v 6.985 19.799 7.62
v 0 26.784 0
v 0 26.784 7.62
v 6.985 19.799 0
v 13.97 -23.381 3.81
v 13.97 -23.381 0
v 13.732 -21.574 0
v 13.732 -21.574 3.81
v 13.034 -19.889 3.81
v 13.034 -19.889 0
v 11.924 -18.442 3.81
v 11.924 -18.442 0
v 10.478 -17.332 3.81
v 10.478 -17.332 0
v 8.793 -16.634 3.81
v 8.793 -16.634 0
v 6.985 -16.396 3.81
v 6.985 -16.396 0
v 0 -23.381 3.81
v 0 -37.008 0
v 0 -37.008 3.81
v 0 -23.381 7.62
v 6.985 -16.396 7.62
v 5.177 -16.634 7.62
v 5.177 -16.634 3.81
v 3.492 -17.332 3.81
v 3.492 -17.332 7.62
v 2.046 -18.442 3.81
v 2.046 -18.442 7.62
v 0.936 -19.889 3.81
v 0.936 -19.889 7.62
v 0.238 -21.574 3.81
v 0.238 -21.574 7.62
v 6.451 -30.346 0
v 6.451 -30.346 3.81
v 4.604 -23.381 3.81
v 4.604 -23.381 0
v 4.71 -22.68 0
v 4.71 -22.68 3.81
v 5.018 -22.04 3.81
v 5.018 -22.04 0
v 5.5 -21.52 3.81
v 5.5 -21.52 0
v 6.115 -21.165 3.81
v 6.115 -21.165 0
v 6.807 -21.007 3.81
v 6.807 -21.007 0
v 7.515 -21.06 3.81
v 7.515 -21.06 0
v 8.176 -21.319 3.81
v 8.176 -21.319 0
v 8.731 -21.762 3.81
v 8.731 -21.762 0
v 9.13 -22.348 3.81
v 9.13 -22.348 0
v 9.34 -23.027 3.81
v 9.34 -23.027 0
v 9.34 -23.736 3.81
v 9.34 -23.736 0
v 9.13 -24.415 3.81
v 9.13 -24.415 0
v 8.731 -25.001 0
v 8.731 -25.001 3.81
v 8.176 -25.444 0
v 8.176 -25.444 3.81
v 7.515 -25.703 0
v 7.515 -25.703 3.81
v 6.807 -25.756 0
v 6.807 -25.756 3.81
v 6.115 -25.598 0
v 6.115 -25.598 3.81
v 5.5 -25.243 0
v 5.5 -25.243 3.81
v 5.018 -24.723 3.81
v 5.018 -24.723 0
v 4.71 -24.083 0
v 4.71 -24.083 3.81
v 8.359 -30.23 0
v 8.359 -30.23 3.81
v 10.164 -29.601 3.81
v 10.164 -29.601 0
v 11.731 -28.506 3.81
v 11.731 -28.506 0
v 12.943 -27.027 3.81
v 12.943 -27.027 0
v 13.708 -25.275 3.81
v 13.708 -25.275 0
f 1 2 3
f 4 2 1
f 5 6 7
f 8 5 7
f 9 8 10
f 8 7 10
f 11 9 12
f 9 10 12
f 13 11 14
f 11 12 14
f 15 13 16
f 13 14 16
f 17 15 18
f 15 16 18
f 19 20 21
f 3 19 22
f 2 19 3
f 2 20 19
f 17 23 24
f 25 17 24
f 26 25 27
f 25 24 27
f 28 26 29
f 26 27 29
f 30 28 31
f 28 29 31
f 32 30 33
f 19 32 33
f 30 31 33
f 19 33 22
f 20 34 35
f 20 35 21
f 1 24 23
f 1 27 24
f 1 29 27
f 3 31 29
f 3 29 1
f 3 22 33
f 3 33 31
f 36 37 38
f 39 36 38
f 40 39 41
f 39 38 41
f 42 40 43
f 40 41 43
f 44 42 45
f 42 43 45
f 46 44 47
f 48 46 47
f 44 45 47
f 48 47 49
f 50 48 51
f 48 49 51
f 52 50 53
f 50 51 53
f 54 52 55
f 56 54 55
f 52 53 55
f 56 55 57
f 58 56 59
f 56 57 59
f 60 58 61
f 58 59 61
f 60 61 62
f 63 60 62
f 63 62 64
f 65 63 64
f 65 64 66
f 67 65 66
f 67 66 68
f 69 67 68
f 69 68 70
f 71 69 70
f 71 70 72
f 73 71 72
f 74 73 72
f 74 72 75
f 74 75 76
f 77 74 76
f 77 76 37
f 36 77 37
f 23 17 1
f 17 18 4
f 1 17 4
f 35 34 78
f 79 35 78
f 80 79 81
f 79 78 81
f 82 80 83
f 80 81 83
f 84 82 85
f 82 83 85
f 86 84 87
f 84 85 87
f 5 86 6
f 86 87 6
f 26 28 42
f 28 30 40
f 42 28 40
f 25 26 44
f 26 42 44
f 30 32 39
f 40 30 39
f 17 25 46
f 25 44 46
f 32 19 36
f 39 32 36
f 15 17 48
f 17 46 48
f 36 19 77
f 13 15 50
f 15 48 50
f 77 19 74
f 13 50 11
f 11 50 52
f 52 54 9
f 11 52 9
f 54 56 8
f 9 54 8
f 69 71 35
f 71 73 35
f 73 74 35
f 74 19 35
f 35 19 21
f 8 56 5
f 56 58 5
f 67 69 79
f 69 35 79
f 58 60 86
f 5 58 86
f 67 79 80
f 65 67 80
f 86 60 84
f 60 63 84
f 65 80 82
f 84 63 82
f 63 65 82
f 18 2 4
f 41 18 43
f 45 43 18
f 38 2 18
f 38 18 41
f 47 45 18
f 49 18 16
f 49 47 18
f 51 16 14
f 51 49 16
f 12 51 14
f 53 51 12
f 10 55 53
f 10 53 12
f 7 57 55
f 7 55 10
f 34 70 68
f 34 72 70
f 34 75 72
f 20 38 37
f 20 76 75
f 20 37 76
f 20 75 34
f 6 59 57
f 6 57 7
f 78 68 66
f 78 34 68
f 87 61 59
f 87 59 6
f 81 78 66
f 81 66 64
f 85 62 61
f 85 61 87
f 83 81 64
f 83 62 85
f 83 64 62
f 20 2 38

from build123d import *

# Parameters (mm, degrees)
F1_DEPTH    = 7.62
F3_DEPTH    = 3.81
F5_DEPTH    = 3.81
F7_D        = 4.7625
F7_DEPTH    = 12.7
F7_TIP      = 1.4307993491
F8_T1_DEPTH = 46.8124487366


# Not quite as in the source:
# - a fillet or chamfer that OpenCascade refuses, or shapes differently, is made with other operations: its cross-section is extruded or revolved along the edge and cut away or added


with BuildPart() as f1:
    # F0 (on Top) → F1 (new body)
    with BuildSketch(Plane.XY):
        with BuildLine():
            Line((6.985, 27.4185502146), (0, 27.4185502146))
            Line((0, 27.4185502146), (0, -23.3814497854))
            ThreePointArc((0, -23.3814497854), (2.0458591334, -18.4423089188), (6.985, -16.3964497854))
            Line((6.985, -16.3964497854), (6.985, 27.4185502146))
        make_face()
        with BuildLine():
            ThreePointArc((6.985, -16.3964497854), (2.0458591334, -18.4423089188), (0, -23.3814497854))
            Line((0, -23.3814497854), (6.985, -23.3814497854))
            Line((6.985, -23.3814497854), (6.985, -16.3964497854))
        make_face()
        with BuildLine():
            Line((6.985, -23.3814497854), (0, -23.3814497854))
            ThreePointArc((0, -23.3814497854), (6.985, -30.3664497854), (13.97, -23.3814497854))
            ThreePointArc((13.97, -23.3814497854), (11.9241408666, -18.4423089188), (6.985, -16.3964497854))
            Line((6.985, -16.3964497854), (6.985, -23.3814497854))
        make_face()
    extrude(amount=F1_DEPTH)

    # F2 (on face) → F3 (cut)
    with BuildSketch(Plane.XY.offset(7.62)):
        with BuildLine():
            ThreePointArc((0, -23.3814497854), (6.985, -30.3664497854), (13.97, -23.3814497854))
            ThreePointArc((13.97, -23.3814497854), (11.9241408666, -18.4423089188), (6.985, -16.3964497854))
            ThreePointArc((6.985, -16.3964497854), (2.0458591334, -18.4423089188), (0, -23.3814497854))
        make_face()
    extrude(amount=-F3_DEPTH, mode=Mode.SUBTRACT)

    # F4 (on face) → F5 (join)
    with BuildSketch(Plane(origin=(0, 0, 0), x_dir=(1, 0, 0), z_dir=(0, 0, -1))):
        with BuildLine():
            Line((0, 37.0080322027), (0, 23.3814497854))
            ThreePointArc((0, 23.3814497854), (1.8603767117, 28.1278653964), (6.4505257418, 30.345971468))
            Line((6.4505257418, 30.345971468), (0, 37.0080322027))
        make_face()
    extrude(amount=-F5_DEPTH)

    # F7
    with Locations(Plane.XY.offset(3.81)):
        with Locations((6.985, -23.3814497854)):
            Hole(F7_D / 2, depth=F7_DEPTH)
            with Locations((0, 0, -(F7_DEPTH + F7_TIP / 2))):  # 118° drill point
                Cone(0, F7_D / 2, F7_TIP, mode=Mode.SUBTRACT)

    # F8: chamfer of 7.62 on 1 edges, made by hand

    # F8_s2 → F8_t1 (cut)
    with BuildSketch(Plane.XY.offset(-19.5962243683)):
        Polygon((-0.635, 27.4185502146), (6.985, 19.7985502146), (6.985, 27.4185502146), align=None)
    extrude(amount=F8_T1_DEPTH, mode=Mode.SUBTRACT)


solid = f1.part
